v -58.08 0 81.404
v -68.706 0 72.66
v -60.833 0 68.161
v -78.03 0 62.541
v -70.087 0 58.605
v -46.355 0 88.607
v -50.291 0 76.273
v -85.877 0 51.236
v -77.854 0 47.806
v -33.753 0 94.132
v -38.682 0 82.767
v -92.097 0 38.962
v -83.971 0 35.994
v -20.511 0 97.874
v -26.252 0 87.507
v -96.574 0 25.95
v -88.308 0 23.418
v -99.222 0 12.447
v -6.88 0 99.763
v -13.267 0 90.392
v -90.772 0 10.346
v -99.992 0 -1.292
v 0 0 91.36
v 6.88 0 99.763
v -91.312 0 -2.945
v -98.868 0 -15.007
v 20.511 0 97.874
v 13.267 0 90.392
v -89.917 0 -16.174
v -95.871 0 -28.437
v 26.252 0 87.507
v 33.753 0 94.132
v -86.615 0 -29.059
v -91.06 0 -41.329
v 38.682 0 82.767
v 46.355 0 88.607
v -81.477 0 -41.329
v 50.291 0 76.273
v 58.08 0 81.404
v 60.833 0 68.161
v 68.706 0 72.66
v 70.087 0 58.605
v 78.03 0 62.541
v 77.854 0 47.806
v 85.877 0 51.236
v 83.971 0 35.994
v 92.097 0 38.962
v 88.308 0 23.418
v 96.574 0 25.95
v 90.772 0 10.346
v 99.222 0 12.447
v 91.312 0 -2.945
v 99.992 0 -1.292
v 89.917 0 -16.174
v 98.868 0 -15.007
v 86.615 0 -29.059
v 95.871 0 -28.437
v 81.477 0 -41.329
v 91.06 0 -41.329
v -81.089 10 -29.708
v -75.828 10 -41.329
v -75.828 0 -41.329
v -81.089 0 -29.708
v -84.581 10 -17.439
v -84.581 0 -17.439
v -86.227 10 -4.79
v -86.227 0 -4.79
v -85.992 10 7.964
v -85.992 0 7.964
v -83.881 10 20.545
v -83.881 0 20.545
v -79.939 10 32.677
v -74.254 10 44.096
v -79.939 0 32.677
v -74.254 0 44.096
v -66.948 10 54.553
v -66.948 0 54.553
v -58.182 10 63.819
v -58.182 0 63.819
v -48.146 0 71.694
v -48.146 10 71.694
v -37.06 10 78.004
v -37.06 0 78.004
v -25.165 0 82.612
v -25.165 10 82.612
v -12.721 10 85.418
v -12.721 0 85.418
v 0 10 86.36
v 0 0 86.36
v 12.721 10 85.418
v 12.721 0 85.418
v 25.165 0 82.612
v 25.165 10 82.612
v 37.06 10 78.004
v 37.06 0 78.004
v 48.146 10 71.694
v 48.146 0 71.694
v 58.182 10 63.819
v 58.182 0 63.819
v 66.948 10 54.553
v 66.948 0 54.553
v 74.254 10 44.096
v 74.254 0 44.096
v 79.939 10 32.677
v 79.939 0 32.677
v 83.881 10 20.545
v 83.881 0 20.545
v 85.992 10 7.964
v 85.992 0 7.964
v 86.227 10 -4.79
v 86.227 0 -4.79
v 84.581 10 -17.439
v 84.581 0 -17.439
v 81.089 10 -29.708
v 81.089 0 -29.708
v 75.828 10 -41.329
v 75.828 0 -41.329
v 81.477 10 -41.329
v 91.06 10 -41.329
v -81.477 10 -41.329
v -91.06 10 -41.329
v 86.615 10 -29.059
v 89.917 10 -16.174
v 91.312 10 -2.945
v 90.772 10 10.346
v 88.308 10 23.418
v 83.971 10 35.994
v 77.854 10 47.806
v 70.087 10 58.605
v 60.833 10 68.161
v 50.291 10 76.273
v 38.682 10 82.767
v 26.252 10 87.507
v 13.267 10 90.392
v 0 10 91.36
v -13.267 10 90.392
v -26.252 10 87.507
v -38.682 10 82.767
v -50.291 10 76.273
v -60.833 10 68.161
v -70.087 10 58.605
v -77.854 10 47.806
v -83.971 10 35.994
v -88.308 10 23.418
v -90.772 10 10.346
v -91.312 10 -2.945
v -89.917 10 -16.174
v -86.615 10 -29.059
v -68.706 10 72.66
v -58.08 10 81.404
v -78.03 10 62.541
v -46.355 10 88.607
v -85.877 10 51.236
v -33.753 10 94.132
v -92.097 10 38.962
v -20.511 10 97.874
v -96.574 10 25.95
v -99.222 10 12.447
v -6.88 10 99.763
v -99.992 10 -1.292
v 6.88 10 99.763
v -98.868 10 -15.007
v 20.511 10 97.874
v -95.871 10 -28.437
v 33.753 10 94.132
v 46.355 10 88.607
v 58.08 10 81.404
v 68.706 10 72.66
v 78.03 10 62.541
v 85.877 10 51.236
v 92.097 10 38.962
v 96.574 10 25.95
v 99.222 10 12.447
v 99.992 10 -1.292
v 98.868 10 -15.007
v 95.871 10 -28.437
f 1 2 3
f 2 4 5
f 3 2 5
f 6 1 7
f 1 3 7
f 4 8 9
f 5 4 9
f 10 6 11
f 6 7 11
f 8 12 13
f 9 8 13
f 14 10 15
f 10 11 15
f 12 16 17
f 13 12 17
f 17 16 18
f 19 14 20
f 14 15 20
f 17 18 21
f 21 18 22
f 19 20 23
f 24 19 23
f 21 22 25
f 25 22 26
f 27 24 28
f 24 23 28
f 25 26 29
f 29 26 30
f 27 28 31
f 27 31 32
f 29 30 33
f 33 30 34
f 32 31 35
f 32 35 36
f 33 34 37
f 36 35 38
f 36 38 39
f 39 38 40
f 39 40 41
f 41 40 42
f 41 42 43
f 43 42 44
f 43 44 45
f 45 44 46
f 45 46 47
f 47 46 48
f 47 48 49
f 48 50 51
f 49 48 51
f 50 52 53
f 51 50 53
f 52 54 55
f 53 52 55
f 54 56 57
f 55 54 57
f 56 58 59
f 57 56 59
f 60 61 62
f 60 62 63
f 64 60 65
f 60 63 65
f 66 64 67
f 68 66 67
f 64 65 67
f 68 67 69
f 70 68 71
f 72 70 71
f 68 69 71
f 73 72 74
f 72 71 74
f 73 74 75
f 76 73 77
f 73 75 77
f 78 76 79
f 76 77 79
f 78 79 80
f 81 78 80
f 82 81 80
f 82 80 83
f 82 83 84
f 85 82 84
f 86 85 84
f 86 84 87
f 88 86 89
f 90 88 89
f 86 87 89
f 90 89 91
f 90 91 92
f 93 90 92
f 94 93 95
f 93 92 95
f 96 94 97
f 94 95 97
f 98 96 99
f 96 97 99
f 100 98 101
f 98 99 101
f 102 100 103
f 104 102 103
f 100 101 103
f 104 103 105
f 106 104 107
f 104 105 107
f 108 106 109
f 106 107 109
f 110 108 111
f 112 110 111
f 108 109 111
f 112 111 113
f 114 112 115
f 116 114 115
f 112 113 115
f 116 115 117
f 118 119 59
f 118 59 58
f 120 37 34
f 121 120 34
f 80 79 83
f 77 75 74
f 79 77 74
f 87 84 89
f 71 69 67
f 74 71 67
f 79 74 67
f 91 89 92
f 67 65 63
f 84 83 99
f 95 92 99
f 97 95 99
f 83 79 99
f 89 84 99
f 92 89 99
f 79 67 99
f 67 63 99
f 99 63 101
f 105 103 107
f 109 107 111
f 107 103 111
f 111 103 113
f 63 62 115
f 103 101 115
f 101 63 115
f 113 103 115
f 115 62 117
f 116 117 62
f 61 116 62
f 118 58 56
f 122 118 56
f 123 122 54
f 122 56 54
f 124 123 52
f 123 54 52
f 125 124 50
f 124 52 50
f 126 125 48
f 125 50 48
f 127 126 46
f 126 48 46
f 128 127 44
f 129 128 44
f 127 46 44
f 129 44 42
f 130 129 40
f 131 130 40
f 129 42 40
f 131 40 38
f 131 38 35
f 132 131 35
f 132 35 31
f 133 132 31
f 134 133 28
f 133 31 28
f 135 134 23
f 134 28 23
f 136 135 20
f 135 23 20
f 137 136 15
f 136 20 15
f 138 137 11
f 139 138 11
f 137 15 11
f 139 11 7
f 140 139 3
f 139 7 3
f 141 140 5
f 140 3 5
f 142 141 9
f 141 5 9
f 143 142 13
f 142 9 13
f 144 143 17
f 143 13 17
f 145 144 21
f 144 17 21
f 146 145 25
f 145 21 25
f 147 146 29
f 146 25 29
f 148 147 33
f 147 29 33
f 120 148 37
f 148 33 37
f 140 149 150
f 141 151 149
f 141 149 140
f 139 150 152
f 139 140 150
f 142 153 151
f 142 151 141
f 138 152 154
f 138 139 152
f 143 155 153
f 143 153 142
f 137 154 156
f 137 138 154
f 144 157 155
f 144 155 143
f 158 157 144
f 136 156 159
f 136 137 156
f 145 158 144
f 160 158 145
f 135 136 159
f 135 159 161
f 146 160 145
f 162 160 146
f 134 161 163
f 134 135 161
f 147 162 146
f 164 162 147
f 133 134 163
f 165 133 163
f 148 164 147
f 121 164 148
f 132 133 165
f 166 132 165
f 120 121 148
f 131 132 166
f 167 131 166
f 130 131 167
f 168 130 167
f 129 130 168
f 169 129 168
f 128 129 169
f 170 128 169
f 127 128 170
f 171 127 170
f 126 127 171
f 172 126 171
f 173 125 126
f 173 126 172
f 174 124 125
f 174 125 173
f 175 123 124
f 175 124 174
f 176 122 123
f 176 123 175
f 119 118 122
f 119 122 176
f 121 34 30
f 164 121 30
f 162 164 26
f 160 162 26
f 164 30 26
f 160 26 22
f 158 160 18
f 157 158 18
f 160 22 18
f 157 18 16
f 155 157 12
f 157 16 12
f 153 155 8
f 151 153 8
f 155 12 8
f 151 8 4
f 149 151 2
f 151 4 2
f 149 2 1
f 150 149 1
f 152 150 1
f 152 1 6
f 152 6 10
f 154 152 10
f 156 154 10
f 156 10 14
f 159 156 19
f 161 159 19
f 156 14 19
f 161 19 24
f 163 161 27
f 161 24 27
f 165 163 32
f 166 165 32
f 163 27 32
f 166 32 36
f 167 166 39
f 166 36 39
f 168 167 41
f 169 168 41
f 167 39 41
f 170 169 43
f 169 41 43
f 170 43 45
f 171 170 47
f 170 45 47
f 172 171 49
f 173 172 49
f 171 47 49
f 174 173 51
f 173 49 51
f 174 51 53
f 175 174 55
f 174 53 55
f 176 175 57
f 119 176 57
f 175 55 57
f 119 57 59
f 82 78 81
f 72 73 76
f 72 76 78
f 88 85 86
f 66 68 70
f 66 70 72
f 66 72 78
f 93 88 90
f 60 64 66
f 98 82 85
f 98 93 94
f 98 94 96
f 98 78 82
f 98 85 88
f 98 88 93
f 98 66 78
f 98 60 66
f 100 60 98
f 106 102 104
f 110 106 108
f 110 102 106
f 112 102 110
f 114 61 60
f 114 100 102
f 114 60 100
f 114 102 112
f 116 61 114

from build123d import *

# Parameters (mm, degrees)
AUFSATZ_LINEAR_AUSTRAGEN1_DEPTH   = 10
AUFSATZ_LINEAR_AUSTRAGEN1_2_DEPTH = 10


with BuildPart() as part:
    # Skizze1 → Aufsatz-Linear austragen1 (new body)
    with BuildSketch(Plane(origin=(0, 0, 0), x_dir=(1, 0, 0), z_dir=(0, 1, 0))):
        with BuildLine():
            ThreePointArc((-75.828335412, 41.329255816), (0, -86.359966638), (75.828335412, 41.329255816))
            Line((75.828335412, 41.329255816), (-75.828335412, 41.329255816))
        make_face()
    extrude(amount=AUFSATZ_LINEAR_AUSTRAGEN1_DEPTH)


with BuildPart() as body_2:
    # Skizze1 → Aufsatz-Linear austragen1 2 (new body)
    with BuildSketch(Plane(origin=(0, 0, 0), x_dir=(1, 0, 0), z_dir=(0, 1, 0))):
        with BuildLine():
            ThreePointArc((-91.059829858, 41.329255816), (0, -100), (91.059829858, 41.329255816))
            Line((91.059829858, 41.329255816), (81.47721226, 41.329255816))
            ThreePointArc((81.47721226, 41.329255816), (0, -91.359966638), (-81.47721226, 41.329255816))
            Line((-81.47721226, 41.329255816), (-91.059829858, 41.329255816))
        make_face()
    extrude(amount=AUFSATZ_LINEAR_AUSTRAGEN1_2_DEPTH)


solid = Compound([part.part, body_2.part])
